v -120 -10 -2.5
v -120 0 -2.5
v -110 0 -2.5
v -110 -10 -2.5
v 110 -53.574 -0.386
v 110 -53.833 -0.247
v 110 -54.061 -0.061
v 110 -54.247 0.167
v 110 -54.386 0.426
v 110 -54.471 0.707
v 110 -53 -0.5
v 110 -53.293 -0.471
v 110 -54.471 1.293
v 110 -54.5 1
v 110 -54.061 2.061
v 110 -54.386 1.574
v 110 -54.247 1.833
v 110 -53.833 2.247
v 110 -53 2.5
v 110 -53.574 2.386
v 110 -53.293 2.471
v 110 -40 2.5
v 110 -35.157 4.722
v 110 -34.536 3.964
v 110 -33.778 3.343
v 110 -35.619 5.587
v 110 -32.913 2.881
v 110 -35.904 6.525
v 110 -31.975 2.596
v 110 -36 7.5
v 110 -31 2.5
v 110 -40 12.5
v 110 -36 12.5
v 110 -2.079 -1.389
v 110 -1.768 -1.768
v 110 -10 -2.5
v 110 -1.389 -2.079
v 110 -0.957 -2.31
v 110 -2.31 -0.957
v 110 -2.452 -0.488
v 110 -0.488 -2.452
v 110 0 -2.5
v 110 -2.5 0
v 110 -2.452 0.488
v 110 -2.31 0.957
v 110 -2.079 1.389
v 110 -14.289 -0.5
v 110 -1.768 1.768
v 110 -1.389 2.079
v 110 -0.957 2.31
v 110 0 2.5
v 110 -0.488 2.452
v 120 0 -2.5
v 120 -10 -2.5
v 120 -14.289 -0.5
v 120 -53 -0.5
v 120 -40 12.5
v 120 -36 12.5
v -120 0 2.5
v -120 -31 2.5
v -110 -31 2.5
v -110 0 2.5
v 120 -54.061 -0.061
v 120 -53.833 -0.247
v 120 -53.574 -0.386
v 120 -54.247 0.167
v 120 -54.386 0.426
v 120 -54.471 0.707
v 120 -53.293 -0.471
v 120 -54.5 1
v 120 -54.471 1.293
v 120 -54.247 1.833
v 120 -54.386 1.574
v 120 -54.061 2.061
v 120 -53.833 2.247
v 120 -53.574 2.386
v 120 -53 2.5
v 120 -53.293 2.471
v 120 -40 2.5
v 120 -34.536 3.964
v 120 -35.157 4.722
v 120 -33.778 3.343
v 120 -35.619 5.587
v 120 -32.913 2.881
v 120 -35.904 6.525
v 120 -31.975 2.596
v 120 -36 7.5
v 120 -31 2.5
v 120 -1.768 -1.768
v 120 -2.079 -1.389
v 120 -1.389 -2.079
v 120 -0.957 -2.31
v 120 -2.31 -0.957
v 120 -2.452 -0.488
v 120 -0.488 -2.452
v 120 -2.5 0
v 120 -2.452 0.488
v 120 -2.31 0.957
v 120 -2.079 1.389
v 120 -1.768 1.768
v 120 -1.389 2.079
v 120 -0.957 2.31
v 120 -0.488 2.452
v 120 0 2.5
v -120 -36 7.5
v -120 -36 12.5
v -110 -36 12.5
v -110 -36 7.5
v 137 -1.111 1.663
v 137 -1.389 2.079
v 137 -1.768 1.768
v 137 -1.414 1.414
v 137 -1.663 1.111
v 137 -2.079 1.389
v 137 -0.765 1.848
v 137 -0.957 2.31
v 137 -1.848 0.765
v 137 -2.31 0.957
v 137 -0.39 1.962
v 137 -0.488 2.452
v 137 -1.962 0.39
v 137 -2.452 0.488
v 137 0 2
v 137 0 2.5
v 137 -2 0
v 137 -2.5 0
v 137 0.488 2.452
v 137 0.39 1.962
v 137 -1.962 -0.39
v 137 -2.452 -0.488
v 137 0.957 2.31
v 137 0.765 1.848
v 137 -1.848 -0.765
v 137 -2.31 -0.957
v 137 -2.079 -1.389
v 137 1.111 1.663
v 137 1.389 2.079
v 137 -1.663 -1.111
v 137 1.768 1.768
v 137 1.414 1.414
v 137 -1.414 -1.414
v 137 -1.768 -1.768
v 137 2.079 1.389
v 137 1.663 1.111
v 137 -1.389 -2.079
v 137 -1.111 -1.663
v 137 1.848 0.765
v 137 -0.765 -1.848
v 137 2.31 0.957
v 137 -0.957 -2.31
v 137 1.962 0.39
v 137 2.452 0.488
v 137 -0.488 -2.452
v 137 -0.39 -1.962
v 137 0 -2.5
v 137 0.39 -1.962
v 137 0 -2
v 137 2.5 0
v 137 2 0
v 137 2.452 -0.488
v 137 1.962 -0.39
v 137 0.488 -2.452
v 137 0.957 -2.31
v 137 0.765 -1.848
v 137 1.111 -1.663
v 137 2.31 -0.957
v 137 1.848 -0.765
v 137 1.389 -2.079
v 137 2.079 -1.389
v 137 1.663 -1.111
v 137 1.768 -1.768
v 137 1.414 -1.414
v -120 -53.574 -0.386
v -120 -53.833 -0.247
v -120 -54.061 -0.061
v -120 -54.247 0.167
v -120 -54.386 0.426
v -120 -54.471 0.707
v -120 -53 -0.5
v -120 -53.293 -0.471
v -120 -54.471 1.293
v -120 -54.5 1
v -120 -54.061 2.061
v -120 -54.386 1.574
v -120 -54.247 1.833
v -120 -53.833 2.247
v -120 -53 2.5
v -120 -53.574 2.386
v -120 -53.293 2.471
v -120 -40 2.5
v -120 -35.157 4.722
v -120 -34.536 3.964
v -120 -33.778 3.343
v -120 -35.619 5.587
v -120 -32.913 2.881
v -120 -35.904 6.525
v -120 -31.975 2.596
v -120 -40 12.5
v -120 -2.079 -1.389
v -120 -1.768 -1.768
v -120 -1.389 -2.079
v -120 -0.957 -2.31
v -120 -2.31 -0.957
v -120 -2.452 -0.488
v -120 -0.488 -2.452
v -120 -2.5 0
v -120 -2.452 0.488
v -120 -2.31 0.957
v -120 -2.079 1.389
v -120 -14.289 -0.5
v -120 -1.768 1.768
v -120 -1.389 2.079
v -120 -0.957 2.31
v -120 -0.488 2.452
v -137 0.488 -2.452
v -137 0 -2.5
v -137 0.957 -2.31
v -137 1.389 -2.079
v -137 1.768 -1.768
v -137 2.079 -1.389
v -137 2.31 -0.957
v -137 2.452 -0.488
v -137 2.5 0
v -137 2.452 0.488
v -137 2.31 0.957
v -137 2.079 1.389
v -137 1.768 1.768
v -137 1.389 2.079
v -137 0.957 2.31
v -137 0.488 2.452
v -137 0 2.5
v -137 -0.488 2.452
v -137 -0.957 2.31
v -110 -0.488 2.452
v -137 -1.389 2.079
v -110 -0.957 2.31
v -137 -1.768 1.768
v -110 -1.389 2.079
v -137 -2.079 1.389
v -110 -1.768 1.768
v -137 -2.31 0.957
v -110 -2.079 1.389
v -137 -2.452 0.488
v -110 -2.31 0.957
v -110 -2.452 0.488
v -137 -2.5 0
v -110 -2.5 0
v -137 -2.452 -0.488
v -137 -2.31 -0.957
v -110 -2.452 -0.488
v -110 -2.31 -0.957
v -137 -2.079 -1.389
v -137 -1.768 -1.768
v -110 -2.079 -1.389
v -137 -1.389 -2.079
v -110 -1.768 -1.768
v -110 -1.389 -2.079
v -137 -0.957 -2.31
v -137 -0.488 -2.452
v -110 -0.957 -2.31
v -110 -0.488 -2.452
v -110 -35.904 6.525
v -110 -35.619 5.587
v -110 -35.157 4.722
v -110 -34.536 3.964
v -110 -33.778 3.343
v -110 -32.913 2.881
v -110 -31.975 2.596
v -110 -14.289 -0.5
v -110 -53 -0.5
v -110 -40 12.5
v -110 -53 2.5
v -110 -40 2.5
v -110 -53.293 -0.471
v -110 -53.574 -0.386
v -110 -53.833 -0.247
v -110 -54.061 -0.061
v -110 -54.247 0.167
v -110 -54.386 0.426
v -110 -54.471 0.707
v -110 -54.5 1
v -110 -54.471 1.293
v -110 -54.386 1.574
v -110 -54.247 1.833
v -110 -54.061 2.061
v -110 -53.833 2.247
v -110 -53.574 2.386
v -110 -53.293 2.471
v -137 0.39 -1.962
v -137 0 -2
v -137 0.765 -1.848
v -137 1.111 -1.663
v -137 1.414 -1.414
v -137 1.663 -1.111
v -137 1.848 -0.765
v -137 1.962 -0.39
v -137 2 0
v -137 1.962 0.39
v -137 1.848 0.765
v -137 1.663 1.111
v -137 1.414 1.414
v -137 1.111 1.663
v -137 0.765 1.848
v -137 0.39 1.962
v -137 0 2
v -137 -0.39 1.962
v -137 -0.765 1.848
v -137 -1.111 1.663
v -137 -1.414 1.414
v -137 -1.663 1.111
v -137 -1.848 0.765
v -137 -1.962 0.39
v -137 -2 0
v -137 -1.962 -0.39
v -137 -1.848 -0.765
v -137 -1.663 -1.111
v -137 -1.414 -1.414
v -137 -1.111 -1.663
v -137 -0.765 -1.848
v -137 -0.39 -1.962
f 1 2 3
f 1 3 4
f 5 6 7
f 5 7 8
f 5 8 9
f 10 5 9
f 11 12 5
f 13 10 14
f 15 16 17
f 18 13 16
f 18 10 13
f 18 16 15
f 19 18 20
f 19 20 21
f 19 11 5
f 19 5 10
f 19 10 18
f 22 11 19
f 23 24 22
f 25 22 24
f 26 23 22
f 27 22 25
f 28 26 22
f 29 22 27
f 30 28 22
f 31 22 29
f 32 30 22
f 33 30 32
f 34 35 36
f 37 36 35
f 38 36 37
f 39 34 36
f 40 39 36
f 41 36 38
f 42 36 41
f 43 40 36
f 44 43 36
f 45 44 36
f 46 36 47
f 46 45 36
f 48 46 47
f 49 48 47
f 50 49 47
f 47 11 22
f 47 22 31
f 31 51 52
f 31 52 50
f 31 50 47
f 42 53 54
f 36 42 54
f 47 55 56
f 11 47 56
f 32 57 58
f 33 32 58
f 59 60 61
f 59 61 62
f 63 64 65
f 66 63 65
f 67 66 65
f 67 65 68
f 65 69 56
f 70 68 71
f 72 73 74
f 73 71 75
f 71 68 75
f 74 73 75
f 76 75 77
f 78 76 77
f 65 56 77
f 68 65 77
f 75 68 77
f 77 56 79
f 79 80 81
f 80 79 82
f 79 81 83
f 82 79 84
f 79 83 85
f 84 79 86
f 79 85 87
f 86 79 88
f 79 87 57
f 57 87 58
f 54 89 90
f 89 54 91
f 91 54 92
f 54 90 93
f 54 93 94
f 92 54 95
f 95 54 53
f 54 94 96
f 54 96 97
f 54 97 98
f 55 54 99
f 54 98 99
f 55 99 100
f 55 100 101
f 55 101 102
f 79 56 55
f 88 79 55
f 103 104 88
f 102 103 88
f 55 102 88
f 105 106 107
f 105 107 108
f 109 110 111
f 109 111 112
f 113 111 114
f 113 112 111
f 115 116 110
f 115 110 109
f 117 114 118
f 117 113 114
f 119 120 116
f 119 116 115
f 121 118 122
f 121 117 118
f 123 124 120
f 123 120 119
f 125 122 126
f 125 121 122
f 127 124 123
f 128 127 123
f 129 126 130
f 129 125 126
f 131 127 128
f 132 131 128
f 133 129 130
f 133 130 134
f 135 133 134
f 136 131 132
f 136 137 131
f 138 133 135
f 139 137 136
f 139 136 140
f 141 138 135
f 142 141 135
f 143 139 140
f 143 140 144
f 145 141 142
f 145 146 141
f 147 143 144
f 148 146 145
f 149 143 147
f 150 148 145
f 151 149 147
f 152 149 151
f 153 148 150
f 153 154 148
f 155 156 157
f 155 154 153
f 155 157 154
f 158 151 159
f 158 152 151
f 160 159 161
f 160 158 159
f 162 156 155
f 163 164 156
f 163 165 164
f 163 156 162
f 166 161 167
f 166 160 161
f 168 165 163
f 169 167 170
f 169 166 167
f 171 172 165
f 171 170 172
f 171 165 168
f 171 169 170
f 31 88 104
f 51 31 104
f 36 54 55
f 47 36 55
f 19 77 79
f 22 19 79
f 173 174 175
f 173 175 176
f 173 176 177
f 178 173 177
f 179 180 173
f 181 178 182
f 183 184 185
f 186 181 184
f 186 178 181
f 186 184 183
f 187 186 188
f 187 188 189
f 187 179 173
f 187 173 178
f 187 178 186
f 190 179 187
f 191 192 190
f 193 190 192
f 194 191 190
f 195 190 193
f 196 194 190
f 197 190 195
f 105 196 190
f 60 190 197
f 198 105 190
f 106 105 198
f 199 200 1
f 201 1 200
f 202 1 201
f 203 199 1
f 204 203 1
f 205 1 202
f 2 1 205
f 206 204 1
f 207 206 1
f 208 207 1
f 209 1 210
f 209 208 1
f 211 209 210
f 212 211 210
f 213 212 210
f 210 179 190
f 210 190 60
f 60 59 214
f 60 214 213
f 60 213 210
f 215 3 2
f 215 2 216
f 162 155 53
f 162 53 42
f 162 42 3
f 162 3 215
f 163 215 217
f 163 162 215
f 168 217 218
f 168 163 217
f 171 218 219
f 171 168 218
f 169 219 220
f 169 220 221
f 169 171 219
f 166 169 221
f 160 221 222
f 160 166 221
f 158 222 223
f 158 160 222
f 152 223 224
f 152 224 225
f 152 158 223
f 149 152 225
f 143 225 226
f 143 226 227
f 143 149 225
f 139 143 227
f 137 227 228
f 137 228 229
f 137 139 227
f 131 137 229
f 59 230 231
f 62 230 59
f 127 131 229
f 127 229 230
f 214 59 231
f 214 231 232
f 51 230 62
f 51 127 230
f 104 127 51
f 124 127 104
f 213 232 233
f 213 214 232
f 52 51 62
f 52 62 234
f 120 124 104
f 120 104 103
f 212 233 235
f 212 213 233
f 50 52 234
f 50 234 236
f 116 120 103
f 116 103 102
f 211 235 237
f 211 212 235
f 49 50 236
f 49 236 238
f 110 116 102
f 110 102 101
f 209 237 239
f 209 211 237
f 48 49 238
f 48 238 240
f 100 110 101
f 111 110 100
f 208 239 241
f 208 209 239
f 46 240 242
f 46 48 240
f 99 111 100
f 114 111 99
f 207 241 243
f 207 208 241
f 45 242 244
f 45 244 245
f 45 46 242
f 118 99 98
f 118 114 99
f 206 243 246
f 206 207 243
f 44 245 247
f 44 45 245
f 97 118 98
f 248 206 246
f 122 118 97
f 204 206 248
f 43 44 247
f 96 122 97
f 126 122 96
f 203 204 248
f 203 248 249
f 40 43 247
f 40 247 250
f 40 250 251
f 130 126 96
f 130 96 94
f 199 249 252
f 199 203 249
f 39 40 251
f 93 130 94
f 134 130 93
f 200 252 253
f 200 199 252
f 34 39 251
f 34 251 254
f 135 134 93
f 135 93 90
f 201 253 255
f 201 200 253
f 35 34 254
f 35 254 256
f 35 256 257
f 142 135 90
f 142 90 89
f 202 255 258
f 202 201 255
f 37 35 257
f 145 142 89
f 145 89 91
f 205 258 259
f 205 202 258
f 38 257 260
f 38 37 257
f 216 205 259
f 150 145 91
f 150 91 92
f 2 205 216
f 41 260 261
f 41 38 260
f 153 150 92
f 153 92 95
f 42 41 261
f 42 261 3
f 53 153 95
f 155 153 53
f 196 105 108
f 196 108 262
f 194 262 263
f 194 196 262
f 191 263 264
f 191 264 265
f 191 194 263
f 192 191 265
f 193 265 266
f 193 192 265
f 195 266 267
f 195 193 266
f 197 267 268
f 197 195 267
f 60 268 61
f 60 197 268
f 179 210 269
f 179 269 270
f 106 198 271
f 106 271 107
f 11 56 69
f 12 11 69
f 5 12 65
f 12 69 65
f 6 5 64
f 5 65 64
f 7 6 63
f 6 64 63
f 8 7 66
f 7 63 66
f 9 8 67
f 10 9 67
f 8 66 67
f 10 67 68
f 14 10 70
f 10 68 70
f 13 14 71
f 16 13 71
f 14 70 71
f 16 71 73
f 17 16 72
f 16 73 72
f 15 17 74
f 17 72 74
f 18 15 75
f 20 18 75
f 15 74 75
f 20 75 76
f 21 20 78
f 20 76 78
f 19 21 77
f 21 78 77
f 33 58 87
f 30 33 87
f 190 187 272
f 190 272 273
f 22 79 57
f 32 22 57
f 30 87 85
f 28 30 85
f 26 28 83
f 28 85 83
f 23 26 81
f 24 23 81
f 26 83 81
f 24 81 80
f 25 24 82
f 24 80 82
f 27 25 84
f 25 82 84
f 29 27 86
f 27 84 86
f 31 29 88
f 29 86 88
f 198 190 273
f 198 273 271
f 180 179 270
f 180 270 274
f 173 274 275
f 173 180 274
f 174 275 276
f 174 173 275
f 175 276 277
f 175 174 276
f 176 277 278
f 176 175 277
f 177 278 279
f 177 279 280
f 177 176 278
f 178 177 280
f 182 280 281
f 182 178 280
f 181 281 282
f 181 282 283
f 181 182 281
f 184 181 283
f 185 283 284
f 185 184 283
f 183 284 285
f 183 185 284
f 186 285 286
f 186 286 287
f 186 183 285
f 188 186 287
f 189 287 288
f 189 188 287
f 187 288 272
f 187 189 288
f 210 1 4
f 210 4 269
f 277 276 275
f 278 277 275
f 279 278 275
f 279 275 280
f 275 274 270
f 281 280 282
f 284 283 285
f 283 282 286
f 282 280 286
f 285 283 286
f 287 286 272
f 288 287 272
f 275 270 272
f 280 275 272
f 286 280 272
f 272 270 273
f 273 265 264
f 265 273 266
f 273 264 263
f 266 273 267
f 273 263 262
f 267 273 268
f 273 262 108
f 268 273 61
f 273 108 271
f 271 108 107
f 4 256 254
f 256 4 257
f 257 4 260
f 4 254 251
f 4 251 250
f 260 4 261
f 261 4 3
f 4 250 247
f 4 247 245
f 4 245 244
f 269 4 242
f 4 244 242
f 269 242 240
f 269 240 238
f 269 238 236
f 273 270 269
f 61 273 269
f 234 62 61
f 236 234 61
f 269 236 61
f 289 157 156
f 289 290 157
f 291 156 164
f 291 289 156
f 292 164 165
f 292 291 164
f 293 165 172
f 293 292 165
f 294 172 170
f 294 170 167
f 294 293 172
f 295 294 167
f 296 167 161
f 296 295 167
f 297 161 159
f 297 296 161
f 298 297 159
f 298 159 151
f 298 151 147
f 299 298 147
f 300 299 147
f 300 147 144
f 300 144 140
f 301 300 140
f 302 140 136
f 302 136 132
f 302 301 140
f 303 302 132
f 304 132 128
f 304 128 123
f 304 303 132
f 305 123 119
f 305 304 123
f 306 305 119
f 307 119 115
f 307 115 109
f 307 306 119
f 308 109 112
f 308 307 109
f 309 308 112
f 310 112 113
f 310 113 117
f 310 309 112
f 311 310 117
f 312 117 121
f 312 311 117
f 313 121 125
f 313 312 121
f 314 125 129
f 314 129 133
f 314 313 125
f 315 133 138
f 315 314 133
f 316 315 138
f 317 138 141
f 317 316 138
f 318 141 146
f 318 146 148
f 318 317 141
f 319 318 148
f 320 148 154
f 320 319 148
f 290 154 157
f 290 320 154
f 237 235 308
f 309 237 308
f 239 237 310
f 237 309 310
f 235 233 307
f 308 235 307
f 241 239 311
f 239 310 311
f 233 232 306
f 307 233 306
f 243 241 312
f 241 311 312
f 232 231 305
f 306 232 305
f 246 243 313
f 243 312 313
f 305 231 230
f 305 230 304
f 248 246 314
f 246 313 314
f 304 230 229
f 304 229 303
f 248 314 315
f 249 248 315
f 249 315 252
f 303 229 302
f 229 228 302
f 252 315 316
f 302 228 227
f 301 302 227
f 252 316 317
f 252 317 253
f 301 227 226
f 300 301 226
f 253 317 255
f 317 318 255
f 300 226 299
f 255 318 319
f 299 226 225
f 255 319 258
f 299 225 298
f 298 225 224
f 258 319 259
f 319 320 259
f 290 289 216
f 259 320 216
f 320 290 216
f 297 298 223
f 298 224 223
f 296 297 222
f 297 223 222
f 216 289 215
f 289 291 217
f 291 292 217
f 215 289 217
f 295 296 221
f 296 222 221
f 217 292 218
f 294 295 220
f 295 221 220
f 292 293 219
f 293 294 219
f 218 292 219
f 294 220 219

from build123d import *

# Parameters (mm, degrees)
SKETCH_1_R      = 2.5
SKETCH_1_R_2    = 2
EXTRUDE_1_DEPTH = 137
EXTRUDE_2_DEPTH = 10


with BuildPart() as part:
    # 草圖1 → 填料-伸長1 (new, symmetric)
    with BuildSketch(Plane(origin=(0, 0, 0), x_dir=(0, 0, -1), z_dir=(1, 0, 0))):
        Circle(SKETCH_1_R)
        Circle(SKETCH_1_R_2, mode=Mode.SUBTRACT)
    extrude(amount=EXTRUDE_1_DEPTH, both=True)

    # 草圖3 → 填料-伸長2 (add)
    with BuildSketch(Plane(origin=(120, 0, 0), x_dir=(0, 0, -1), z_dir=(1, 0, 0))):
        with BuildLine():
            Line((2.5, 0), (2.5, -10))
            Line((2.5, -10), (0.5, -14.289013841))
            Line((0.5, -14.289013841), (0.5, -53))
            ThreePointArc((0.5, -53), (-1, -54.5), (-2.5, -53))
            Line((-2.5, -53), (-2.5, -40))
            Line((-2.5, -40), (-12.5, -40))
            Line((-12.5, -40), (-12.5, -36))
            Line((-12.5, -36), (-7.5, -36))
            ThreePointArc((-7.5, -36), (-3.964466094, -34.535533906), (-2.5, -31))
            Line((-2.5, -31), (-2.5, 0))
            ThreePointArc((-2.5, 0), (0, -2.5), (2.5, 0))
        make_face()
    extrude_2 = extrude(amount=-EXTRUDE_2_DEPTH)

    # 鏡射1: 填料-伸長2 across plane
    add(extrude_2.mirror(Plane(origin=(0, 0, 0), x_dir=(0, 0, 1), z_dir=(1, 0, 0))))


solid = part.part
